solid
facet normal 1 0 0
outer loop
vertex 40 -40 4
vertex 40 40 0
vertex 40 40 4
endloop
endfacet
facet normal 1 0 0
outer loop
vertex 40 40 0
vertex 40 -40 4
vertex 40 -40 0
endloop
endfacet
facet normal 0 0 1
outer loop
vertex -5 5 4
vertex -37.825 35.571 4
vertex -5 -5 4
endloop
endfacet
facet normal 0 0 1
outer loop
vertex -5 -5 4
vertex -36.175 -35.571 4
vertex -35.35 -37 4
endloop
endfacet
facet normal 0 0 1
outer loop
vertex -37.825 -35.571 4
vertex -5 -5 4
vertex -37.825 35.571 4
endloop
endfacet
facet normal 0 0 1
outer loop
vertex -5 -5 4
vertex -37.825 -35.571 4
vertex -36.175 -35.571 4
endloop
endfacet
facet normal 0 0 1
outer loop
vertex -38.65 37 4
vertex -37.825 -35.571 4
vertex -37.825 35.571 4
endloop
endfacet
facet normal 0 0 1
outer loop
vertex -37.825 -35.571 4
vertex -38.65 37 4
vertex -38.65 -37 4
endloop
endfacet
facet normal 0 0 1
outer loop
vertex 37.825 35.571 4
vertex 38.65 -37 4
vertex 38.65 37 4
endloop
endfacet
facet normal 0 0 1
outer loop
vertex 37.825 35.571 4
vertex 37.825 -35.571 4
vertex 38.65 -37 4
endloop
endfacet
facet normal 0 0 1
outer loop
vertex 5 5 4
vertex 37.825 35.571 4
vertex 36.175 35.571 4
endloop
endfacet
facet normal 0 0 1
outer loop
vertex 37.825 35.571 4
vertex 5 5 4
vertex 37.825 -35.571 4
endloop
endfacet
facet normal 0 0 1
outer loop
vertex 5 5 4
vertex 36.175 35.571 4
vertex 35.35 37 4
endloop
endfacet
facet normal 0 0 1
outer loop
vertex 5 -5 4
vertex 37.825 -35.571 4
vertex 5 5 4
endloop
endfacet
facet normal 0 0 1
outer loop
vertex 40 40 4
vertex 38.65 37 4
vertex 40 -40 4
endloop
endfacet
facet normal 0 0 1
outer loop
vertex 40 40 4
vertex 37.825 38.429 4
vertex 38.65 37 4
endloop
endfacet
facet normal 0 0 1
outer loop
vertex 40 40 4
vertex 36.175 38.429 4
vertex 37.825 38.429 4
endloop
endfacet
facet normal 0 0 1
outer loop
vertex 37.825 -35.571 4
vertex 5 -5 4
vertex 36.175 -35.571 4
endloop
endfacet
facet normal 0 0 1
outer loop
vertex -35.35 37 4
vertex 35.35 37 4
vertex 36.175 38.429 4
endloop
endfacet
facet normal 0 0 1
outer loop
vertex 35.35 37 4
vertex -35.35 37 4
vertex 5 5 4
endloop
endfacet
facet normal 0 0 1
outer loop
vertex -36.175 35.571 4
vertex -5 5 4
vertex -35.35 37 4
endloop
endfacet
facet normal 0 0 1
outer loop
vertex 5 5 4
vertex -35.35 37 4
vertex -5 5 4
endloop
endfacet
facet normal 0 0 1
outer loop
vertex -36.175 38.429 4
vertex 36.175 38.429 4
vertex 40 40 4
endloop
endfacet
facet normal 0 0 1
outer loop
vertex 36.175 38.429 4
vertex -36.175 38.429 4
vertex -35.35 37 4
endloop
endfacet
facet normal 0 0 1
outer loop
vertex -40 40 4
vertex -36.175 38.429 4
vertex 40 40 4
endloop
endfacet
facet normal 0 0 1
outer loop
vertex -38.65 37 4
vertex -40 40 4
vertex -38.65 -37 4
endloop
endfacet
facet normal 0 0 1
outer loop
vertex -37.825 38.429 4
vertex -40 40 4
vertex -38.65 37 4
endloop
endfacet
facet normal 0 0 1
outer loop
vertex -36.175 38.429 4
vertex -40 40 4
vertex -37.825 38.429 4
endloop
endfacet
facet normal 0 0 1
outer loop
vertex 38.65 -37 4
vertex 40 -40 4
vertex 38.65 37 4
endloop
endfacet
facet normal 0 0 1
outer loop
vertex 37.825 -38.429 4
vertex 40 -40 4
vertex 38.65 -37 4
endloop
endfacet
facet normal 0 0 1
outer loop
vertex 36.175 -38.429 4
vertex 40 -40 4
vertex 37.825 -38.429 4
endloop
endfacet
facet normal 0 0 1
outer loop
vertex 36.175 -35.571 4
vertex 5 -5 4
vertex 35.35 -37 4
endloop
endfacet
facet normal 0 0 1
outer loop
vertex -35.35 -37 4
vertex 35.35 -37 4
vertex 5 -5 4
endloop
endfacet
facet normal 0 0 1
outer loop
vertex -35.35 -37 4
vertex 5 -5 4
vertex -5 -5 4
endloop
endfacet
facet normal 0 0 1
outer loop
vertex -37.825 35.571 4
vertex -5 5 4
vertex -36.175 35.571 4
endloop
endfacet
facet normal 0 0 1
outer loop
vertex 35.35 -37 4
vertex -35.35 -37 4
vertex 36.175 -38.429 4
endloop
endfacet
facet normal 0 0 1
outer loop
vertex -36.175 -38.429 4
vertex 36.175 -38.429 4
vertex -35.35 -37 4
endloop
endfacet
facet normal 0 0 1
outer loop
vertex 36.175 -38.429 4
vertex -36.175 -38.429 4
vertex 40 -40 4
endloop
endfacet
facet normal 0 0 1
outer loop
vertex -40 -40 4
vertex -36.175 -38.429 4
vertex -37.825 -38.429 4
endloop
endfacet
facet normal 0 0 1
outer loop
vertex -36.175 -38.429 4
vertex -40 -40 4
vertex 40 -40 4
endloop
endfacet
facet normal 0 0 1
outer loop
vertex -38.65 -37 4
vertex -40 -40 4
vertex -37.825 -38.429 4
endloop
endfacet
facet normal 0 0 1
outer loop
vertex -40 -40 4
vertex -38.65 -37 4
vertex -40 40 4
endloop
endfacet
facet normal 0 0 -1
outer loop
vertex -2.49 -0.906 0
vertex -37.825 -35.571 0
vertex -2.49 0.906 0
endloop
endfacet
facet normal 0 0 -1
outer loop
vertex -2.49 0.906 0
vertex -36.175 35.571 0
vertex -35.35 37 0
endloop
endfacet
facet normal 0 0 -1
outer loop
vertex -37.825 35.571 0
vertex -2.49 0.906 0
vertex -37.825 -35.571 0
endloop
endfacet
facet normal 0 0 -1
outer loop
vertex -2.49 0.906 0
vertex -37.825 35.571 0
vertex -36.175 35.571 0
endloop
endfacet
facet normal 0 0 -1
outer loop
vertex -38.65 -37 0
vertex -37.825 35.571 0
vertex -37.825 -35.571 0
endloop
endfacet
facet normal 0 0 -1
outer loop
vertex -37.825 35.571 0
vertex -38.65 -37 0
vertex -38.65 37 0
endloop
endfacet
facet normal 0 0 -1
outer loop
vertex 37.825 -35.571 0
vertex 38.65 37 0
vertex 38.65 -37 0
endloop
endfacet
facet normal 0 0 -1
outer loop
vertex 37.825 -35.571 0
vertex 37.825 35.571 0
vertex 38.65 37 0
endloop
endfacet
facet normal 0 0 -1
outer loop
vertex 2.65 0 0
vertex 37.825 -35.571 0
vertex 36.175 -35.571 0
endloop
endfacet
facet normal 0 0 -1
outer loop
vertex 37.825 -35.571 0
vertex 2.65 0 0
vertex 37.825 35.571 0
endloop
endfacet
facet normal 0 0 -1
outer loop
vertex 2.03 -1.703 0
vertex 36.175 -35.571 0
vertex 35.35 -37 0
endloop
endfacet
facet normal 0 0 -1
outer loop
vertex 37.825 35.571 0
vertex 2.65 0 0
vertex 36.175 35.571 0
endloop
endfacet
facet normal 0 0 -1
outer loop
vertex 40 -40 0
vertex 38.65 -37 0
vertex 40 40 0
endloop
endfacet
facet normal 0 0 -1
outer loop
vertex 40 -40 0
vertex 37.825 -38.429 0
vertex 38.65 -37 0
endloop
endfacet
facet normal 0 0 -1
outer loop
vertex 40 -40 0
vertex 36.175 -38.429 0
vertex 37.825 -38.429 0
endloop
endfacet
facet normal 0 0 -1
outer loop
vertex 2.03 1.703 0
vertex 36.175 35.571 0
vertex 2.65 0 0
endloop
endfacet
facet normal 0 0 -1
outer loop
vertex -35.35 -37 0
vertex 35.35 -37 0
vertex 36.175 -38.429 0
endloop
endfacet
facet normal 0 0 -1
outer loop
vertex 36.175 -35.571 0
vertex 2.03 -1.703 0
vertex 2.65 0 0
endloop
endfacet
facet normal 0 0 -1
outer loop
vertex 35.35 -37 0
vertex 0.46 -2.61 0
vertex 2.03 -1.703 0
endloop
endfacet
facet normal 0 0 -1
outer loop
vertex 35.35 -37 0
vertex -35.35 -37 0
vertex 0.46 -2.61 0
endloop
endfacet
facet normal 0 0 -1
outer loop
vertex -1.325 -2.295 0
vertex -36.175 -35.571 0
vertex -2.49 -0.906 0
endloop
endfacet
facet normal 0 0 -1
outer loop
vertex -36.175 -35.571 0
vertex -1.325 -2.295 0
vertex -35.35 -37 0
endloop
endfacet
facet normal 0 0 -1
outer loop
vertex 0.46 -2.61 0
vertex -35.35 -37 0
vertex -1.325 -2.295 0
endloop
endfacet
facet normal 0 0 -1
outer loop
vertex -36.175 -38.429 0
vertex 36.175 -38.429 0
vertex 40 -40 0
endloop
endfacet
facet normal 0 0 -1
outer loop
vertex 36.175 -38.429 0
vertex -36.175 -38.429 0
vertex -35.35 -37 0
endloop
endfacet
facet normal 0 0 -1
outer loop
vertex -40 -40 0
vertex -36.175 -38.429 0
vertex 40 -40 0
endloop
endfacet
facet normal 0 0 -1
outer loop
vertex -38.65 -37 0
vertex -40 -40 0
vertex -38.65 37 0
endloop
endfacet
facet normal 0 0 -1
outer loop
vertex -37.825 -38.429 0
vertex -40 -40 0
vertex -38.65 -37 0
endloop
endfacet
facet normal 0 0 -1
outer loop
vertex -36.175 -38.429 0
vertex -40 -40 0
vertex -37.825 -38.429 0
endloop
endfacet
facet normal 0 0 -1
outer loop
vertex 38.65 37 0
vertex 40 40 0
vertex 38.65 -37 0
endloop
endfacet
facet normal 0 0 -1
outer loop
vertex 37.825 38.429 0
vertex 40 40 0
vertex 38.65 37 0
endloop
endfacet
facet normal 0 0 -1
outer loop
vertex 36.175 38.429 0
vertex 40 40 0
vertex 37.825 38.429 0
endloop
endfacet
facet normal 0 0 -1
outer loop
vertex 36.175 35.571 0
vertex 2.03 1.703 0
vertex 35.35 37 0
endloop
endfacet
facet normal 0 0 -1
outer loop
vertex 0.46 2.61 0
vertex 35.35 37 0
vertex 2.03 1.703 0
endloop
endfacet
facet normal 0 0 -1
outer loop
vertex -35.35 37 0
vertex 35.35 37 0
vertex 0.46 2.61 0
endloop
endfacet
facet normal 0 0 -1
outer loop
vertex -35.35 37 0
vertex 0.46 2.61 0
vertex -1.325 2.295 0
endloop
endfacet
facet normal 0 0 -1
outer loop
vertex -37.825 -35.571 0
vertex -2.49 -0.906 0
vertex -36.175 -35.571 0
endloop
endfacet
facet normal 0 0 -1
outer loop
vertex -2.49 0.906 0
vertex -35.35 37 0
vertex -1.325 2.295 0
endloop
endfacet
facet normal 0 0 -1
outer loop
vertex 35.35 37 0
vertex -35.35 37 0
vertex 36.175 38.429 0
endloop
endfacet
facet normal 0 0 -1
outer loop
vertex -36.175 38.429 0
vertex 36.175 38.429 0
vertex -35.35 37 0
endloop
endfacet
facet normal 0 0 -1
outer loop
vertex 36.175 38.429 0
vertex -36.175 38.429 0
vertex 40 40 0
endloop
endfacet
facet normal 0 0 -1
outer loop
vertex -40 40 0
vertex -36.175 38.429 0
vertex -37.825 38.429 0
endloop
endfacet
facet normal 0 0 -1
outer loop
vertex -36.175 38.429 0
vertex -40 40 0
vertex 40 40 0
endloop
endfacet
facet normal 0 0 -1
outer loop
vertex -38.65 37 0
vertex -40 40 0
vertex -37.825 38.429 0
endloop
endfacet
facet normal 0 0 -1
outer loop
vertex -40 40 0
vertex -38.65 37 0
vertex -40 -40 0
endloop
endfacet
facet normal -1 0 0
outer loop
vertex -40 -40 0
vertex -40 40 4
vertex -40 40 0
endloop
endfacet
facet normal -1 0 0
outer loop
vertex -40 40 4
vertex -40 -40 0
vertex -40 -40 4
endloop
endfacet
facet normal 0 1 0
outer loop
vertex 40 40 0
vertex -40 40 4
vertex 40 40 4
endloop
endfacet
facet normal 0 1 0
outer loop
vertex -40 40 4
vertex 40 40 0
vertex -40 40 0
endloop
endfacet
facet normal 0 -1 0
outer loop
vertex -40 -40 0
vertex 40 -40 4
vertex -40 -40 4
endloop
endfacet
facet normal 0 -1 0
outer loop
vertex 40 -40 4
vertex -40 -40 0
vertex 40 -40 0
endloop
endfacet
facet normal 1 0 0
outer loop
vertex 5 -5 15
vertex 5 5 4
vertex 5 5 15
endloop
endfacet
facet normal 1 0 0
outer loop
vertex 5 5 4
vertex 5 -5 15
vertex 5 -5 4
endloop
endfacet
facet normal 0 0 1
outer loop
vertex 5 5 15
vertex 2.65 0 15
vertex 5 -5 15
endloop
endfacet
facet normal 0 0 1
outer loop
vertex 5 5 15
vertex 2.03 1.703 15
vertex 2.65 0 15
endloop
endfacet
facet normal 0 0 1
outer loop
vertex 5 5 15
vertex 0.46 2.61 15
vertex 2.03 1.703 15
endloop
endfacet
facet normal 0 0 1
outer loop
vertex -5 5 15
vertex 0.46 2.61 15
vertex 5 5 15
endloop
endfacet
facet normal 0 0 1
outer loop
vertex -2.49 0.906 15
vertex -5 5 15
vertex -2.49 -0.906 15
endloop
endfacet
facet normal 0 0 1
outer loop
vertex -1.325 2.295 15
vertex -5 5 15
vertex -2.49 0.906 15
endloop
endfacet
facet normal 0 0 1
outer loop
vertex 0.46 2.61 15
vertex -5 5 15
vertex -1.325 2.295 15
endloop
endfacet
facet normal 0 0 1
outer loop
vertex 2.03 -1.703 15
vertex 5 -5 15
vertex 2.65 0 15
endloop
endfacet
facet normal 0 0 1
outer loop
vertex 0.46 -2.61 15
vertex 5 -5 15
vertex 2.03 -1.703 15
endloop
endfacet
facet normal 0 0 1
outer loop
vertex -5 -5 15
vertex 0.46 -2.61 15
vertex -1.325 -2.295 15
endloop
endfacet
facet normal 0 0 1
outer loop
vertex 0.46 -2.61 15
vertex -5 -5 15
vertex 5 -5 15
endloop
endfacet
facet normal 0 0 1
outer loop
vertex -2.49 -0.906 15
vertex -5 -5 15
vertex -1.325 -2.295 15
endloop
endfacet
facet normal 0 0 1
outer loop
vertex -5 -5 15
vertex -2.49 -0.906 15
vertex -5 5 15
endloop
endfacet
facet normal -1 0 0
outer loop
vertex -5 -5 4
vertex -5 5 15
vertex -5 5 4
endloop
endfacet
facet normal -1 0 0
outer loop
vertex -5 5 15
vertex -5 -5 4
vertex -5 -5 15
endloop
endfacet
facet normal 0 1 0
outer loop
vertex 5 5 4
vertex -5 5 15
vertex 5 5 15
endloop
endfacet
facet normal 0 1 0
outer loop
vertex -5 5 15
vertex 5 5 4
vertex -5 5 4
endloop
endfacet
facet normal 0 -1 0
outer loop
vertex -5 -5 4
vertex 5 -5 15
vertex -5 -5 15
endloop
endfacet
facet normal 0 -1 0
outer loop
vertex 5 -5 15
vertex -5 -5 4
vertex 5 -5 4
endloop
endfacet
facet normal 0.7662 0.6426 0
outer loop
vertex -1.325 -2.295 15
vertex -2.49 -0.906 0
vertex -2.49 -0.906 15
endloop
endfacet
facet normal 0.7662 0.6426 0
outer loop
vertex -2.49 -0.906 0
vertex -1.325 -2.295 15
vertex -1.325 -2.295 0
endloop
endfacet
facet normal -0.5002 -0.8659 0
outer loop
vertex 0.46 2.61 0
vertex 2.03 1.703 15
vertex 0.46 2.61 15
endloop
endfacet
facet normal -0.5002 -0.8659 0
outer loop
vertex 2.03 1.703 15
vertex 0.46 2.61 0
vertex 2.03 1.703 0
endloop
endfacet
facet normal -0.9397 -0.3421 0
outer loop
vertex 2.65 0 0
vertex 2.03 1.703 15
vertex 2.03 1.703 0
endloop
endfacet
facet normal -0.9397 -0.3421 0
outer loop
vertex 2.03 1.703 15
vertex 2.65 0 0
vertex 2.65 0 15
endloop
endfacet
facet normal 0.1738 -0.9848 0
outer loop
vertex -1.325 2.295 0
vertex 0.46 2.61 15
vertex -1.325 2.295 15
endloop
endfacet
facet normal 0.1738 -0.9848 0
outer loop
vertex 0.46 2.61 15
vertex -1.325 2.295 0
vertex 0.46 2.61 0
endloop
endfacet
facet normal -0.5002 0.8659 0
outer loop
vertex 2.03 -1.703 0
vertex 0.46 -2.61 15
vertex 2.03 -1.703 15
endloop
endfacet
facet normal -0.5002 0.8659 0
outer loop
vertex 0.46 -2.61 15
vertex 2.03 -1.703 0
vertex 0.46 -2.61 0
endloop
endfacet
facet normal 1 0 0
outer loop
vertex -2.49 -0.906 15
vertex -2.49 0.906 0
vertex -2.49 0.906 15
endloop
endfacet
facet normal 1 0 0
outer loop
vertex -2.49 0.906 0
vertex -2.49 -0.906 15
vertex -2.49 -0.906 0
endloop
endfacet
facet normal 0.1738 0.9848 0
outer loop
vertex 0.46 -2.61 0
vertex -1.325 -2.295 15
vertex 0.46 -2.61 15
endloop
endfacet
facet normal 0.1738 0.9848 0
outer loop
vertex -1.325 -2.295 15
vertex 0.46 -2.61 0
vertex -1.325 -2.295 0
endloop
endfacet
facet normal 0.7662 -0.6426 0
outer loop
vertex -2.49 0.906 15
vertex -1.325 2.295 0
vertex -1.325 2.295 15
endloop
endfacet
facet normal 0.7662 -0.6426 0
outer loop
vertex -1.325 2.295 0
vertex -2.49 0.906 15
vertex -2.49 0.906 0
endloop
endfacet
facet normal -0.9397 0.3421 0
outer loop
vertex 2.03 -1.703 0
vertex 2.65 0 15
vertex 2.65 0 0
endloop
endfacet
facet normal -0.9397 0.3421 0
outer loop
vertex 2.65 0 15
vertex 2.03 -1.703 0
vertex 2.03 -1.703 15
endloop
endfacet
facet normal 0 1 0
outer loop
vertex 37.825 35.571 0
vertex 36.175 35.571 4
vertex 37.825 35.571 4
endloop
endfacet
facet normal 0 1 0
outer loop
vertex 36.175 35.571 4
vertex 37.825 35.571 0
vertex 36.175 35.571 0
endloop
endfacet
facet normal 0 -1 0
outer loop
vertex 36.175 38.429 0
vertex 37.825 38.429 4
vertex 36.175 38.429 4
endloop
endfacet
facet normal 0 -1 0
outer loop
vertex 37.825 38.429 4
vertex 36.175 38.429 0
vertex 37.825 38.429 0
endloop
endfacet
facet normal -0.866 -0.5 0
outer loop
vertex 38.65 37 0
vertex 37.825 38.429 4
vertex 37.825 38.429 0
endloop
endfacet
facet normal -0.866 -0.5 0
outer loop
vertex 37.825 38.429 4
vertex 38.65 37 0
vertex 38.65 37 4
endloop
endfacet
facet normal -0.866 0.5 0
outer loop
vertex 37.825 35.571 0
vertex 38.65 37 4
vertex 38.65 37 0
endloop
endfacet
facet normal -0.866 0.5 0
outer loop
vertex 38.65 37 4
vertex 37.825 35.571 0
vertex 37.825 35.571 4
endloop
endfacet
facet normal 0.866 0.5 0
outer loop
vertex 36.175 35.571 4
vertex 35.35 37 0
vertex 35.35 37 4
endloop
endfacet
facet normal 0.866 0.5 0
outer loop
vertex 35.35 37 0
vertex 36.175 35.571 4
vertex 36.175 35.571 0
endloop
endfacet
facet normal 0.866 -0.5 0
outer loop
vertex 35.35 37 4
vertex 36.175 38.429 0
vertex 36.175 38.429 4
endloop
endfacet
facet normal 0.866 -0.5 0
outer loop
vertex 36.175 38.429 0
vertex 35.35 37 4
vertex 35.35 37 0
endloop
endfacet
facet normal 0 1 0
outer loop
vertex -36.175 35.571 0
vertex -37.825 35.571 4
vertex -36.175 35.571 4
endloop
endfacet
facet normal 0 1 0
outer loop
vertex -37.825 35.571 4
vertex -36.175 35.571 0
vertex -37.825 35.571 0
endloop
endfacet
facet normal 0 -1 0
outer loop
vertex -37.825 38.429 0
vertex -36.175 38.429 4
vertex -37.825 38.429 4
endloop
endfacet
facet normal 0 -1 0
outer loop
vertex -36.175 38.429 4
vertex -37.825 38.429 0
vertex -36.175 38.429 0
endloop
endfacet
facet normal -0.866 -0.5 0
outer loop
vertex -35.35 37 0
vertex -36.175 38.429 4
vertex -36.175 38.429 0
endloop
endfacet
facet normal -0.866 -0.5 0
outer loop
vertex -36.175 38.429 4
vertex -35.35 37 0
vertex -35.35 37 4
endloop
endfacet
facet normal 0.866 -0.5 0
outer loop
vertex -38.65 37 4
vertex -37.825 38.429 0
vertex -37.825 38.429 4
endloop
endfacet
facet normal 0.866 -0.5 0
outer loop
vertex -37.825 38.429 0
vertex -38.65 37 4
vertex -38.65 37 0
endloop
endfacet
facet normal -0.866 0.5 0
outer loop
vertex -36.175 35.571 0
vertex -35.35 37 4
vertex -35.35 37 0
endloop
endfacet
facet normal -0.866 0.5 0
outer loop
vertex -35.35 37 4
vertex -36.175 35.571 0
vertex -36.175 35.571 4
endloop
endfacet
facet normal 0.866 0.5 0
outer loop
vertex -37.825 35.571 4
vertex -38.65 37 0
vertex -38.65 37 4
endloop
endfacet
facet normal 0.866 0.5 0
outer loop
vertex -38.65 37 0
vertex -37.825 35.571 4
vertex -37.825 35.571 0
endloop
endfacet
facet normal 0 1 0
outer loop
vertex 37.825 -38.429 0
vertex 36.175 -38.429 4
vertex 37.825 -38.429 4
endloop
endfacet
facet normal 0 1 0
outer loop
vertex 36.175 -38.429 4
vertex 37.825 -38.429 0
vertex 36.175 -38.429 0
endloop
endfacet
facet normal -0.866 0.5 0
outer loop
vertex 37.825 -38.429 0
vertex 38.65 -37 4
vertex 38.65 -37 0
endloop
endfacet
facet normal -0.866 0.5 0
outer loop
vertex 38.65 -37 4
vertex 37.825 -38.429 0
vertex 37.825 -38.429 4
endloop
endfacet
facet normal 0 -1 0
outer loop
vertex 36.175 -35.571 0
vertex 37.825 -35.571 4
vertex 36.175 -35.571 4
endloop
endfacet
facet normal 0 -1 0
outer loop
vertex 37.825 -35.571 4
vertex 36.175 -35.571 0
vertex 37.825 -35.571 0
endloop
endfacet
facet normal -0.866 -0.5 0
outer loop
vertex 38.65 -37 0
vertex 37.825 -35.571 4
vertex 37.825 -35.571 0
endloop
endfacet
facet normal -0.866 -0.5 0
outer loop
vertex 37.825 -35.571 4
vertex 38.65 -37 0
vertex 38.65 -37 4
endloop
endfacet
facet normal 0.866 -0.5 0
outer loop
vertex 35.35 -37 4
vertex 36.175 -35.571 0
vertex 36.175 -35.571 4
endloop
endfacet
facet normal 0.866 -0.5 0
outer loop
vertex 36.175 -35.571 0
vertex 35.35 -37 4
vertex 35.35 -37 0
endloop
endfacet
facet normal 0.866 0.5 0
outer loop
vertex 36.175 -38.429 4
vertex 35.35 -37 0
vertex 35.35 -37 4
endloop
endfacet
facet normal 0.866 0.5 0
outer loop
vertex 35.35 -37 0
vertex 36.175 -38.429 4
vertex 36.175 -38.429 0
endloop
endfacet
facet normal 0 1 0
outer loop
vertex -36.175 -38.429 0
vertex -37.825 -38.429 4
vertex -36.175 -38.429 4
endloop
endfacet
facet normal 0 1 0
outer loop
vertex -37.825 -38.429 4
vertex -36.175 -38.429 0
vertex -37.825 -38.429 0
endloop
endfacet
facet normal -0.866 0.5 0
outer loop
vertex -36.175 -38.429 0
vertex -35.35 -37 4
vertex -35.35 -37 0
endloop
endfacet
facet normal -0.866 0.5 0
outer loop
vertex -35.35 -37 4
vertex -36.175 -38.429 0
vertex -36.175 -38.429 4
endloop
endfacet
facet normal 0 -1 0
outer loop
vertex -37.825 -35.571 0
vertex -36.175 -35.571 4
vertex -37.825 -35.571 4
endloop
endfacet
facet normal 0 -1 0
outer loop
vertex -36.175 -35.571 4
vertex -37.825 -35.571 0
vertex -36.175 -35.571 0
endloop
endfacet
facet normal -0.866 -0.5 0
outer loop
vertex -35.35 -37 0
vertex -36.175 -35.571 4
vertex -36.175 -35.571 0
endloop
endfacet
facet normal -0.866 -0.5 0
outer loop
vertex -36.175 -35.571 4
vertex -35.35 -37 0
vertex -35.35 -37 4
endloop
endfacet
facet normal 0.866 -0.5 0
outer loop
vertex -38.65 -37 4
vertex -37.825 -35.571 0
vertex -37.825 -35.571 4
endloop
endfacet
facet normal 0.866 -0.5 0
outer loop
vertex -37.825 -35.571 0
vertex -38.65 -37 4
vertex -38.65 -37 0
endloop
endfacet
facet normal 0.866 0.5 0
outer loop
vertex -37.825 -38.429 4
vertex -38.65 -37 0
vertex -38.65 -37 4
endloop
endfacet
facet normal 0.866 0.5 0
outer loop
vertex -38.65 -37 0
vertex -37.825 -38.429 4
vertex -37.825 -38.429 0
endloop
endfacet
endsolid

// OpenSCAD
//flogowithhole();

hole();

module flogowithhole()
{
    difference()
    {
    translate([0,12.5,63])
    rotate([90,0,0])
    flogo();
    nohole();
    }
}


module flogo()
{
    difference()
    {
    cylinder(r=50, h=25);
    scale([.8,.8,1])
    translate([-90,-90,1])
    linear_extrude(height=35)
    scale([20,20,20])
    import("FLOGO.dxf");
    }
}
module nohole()
{
difference()
{
union()
    {
standBTC();
    translate([-5,-5,0])
    cube([10,10,15]);
    cylinder(r=5.3/2, h=17.5);
    }
  //  cylinder(r=5.3/2, h=18);
    
    translate([37,37,0])
    cylinder(r=3.3/2, h=9);
    translate([-37,37,0])
    cylinder(r=3.3/2, h=9);
    translate([37,-37,0])
    cylinder(r=3.3/2, h=9);
    translate([-37,-37,0])
    cylinder(r=3.3/2, h=9);
    

}  
}
module hole()
{
difference()
{
union()
    {
standBTC();
    translate([-5,-5,0])
    cube([10,10,15]);
  //  cylinder(r=5.3/2, h=20);
    }
    cylinder(r=5.3/2, h=18);
    
    translate([37,37,0])
    cylinder(r=3.3/2, h=9);
    translate([-37,37,0])
    cylinder(r=3.3/2, h=9);
    translate([37,-37,0])
    cylinder(r=3.3/2, h=9);
    translate([-37,-37,0])
    cylinder(r=3.3/2, h=9);
    

}  
}
module standBTC()
{
translate([-40,-40,0])
cube([80,80,4]);
//coin();
}
module coin()
{


rotate([0,0,45])
translate([0,0,43])
    {
union()
        {
logo();
translate([0,5,0])
rotate([90,0,0])
cylinder(h=10, r=50);
            
}
}
}




module oldlogo()
{
import("logo3.stl");
}
module logo()
{
    import("btclogo2.stl");
    }
